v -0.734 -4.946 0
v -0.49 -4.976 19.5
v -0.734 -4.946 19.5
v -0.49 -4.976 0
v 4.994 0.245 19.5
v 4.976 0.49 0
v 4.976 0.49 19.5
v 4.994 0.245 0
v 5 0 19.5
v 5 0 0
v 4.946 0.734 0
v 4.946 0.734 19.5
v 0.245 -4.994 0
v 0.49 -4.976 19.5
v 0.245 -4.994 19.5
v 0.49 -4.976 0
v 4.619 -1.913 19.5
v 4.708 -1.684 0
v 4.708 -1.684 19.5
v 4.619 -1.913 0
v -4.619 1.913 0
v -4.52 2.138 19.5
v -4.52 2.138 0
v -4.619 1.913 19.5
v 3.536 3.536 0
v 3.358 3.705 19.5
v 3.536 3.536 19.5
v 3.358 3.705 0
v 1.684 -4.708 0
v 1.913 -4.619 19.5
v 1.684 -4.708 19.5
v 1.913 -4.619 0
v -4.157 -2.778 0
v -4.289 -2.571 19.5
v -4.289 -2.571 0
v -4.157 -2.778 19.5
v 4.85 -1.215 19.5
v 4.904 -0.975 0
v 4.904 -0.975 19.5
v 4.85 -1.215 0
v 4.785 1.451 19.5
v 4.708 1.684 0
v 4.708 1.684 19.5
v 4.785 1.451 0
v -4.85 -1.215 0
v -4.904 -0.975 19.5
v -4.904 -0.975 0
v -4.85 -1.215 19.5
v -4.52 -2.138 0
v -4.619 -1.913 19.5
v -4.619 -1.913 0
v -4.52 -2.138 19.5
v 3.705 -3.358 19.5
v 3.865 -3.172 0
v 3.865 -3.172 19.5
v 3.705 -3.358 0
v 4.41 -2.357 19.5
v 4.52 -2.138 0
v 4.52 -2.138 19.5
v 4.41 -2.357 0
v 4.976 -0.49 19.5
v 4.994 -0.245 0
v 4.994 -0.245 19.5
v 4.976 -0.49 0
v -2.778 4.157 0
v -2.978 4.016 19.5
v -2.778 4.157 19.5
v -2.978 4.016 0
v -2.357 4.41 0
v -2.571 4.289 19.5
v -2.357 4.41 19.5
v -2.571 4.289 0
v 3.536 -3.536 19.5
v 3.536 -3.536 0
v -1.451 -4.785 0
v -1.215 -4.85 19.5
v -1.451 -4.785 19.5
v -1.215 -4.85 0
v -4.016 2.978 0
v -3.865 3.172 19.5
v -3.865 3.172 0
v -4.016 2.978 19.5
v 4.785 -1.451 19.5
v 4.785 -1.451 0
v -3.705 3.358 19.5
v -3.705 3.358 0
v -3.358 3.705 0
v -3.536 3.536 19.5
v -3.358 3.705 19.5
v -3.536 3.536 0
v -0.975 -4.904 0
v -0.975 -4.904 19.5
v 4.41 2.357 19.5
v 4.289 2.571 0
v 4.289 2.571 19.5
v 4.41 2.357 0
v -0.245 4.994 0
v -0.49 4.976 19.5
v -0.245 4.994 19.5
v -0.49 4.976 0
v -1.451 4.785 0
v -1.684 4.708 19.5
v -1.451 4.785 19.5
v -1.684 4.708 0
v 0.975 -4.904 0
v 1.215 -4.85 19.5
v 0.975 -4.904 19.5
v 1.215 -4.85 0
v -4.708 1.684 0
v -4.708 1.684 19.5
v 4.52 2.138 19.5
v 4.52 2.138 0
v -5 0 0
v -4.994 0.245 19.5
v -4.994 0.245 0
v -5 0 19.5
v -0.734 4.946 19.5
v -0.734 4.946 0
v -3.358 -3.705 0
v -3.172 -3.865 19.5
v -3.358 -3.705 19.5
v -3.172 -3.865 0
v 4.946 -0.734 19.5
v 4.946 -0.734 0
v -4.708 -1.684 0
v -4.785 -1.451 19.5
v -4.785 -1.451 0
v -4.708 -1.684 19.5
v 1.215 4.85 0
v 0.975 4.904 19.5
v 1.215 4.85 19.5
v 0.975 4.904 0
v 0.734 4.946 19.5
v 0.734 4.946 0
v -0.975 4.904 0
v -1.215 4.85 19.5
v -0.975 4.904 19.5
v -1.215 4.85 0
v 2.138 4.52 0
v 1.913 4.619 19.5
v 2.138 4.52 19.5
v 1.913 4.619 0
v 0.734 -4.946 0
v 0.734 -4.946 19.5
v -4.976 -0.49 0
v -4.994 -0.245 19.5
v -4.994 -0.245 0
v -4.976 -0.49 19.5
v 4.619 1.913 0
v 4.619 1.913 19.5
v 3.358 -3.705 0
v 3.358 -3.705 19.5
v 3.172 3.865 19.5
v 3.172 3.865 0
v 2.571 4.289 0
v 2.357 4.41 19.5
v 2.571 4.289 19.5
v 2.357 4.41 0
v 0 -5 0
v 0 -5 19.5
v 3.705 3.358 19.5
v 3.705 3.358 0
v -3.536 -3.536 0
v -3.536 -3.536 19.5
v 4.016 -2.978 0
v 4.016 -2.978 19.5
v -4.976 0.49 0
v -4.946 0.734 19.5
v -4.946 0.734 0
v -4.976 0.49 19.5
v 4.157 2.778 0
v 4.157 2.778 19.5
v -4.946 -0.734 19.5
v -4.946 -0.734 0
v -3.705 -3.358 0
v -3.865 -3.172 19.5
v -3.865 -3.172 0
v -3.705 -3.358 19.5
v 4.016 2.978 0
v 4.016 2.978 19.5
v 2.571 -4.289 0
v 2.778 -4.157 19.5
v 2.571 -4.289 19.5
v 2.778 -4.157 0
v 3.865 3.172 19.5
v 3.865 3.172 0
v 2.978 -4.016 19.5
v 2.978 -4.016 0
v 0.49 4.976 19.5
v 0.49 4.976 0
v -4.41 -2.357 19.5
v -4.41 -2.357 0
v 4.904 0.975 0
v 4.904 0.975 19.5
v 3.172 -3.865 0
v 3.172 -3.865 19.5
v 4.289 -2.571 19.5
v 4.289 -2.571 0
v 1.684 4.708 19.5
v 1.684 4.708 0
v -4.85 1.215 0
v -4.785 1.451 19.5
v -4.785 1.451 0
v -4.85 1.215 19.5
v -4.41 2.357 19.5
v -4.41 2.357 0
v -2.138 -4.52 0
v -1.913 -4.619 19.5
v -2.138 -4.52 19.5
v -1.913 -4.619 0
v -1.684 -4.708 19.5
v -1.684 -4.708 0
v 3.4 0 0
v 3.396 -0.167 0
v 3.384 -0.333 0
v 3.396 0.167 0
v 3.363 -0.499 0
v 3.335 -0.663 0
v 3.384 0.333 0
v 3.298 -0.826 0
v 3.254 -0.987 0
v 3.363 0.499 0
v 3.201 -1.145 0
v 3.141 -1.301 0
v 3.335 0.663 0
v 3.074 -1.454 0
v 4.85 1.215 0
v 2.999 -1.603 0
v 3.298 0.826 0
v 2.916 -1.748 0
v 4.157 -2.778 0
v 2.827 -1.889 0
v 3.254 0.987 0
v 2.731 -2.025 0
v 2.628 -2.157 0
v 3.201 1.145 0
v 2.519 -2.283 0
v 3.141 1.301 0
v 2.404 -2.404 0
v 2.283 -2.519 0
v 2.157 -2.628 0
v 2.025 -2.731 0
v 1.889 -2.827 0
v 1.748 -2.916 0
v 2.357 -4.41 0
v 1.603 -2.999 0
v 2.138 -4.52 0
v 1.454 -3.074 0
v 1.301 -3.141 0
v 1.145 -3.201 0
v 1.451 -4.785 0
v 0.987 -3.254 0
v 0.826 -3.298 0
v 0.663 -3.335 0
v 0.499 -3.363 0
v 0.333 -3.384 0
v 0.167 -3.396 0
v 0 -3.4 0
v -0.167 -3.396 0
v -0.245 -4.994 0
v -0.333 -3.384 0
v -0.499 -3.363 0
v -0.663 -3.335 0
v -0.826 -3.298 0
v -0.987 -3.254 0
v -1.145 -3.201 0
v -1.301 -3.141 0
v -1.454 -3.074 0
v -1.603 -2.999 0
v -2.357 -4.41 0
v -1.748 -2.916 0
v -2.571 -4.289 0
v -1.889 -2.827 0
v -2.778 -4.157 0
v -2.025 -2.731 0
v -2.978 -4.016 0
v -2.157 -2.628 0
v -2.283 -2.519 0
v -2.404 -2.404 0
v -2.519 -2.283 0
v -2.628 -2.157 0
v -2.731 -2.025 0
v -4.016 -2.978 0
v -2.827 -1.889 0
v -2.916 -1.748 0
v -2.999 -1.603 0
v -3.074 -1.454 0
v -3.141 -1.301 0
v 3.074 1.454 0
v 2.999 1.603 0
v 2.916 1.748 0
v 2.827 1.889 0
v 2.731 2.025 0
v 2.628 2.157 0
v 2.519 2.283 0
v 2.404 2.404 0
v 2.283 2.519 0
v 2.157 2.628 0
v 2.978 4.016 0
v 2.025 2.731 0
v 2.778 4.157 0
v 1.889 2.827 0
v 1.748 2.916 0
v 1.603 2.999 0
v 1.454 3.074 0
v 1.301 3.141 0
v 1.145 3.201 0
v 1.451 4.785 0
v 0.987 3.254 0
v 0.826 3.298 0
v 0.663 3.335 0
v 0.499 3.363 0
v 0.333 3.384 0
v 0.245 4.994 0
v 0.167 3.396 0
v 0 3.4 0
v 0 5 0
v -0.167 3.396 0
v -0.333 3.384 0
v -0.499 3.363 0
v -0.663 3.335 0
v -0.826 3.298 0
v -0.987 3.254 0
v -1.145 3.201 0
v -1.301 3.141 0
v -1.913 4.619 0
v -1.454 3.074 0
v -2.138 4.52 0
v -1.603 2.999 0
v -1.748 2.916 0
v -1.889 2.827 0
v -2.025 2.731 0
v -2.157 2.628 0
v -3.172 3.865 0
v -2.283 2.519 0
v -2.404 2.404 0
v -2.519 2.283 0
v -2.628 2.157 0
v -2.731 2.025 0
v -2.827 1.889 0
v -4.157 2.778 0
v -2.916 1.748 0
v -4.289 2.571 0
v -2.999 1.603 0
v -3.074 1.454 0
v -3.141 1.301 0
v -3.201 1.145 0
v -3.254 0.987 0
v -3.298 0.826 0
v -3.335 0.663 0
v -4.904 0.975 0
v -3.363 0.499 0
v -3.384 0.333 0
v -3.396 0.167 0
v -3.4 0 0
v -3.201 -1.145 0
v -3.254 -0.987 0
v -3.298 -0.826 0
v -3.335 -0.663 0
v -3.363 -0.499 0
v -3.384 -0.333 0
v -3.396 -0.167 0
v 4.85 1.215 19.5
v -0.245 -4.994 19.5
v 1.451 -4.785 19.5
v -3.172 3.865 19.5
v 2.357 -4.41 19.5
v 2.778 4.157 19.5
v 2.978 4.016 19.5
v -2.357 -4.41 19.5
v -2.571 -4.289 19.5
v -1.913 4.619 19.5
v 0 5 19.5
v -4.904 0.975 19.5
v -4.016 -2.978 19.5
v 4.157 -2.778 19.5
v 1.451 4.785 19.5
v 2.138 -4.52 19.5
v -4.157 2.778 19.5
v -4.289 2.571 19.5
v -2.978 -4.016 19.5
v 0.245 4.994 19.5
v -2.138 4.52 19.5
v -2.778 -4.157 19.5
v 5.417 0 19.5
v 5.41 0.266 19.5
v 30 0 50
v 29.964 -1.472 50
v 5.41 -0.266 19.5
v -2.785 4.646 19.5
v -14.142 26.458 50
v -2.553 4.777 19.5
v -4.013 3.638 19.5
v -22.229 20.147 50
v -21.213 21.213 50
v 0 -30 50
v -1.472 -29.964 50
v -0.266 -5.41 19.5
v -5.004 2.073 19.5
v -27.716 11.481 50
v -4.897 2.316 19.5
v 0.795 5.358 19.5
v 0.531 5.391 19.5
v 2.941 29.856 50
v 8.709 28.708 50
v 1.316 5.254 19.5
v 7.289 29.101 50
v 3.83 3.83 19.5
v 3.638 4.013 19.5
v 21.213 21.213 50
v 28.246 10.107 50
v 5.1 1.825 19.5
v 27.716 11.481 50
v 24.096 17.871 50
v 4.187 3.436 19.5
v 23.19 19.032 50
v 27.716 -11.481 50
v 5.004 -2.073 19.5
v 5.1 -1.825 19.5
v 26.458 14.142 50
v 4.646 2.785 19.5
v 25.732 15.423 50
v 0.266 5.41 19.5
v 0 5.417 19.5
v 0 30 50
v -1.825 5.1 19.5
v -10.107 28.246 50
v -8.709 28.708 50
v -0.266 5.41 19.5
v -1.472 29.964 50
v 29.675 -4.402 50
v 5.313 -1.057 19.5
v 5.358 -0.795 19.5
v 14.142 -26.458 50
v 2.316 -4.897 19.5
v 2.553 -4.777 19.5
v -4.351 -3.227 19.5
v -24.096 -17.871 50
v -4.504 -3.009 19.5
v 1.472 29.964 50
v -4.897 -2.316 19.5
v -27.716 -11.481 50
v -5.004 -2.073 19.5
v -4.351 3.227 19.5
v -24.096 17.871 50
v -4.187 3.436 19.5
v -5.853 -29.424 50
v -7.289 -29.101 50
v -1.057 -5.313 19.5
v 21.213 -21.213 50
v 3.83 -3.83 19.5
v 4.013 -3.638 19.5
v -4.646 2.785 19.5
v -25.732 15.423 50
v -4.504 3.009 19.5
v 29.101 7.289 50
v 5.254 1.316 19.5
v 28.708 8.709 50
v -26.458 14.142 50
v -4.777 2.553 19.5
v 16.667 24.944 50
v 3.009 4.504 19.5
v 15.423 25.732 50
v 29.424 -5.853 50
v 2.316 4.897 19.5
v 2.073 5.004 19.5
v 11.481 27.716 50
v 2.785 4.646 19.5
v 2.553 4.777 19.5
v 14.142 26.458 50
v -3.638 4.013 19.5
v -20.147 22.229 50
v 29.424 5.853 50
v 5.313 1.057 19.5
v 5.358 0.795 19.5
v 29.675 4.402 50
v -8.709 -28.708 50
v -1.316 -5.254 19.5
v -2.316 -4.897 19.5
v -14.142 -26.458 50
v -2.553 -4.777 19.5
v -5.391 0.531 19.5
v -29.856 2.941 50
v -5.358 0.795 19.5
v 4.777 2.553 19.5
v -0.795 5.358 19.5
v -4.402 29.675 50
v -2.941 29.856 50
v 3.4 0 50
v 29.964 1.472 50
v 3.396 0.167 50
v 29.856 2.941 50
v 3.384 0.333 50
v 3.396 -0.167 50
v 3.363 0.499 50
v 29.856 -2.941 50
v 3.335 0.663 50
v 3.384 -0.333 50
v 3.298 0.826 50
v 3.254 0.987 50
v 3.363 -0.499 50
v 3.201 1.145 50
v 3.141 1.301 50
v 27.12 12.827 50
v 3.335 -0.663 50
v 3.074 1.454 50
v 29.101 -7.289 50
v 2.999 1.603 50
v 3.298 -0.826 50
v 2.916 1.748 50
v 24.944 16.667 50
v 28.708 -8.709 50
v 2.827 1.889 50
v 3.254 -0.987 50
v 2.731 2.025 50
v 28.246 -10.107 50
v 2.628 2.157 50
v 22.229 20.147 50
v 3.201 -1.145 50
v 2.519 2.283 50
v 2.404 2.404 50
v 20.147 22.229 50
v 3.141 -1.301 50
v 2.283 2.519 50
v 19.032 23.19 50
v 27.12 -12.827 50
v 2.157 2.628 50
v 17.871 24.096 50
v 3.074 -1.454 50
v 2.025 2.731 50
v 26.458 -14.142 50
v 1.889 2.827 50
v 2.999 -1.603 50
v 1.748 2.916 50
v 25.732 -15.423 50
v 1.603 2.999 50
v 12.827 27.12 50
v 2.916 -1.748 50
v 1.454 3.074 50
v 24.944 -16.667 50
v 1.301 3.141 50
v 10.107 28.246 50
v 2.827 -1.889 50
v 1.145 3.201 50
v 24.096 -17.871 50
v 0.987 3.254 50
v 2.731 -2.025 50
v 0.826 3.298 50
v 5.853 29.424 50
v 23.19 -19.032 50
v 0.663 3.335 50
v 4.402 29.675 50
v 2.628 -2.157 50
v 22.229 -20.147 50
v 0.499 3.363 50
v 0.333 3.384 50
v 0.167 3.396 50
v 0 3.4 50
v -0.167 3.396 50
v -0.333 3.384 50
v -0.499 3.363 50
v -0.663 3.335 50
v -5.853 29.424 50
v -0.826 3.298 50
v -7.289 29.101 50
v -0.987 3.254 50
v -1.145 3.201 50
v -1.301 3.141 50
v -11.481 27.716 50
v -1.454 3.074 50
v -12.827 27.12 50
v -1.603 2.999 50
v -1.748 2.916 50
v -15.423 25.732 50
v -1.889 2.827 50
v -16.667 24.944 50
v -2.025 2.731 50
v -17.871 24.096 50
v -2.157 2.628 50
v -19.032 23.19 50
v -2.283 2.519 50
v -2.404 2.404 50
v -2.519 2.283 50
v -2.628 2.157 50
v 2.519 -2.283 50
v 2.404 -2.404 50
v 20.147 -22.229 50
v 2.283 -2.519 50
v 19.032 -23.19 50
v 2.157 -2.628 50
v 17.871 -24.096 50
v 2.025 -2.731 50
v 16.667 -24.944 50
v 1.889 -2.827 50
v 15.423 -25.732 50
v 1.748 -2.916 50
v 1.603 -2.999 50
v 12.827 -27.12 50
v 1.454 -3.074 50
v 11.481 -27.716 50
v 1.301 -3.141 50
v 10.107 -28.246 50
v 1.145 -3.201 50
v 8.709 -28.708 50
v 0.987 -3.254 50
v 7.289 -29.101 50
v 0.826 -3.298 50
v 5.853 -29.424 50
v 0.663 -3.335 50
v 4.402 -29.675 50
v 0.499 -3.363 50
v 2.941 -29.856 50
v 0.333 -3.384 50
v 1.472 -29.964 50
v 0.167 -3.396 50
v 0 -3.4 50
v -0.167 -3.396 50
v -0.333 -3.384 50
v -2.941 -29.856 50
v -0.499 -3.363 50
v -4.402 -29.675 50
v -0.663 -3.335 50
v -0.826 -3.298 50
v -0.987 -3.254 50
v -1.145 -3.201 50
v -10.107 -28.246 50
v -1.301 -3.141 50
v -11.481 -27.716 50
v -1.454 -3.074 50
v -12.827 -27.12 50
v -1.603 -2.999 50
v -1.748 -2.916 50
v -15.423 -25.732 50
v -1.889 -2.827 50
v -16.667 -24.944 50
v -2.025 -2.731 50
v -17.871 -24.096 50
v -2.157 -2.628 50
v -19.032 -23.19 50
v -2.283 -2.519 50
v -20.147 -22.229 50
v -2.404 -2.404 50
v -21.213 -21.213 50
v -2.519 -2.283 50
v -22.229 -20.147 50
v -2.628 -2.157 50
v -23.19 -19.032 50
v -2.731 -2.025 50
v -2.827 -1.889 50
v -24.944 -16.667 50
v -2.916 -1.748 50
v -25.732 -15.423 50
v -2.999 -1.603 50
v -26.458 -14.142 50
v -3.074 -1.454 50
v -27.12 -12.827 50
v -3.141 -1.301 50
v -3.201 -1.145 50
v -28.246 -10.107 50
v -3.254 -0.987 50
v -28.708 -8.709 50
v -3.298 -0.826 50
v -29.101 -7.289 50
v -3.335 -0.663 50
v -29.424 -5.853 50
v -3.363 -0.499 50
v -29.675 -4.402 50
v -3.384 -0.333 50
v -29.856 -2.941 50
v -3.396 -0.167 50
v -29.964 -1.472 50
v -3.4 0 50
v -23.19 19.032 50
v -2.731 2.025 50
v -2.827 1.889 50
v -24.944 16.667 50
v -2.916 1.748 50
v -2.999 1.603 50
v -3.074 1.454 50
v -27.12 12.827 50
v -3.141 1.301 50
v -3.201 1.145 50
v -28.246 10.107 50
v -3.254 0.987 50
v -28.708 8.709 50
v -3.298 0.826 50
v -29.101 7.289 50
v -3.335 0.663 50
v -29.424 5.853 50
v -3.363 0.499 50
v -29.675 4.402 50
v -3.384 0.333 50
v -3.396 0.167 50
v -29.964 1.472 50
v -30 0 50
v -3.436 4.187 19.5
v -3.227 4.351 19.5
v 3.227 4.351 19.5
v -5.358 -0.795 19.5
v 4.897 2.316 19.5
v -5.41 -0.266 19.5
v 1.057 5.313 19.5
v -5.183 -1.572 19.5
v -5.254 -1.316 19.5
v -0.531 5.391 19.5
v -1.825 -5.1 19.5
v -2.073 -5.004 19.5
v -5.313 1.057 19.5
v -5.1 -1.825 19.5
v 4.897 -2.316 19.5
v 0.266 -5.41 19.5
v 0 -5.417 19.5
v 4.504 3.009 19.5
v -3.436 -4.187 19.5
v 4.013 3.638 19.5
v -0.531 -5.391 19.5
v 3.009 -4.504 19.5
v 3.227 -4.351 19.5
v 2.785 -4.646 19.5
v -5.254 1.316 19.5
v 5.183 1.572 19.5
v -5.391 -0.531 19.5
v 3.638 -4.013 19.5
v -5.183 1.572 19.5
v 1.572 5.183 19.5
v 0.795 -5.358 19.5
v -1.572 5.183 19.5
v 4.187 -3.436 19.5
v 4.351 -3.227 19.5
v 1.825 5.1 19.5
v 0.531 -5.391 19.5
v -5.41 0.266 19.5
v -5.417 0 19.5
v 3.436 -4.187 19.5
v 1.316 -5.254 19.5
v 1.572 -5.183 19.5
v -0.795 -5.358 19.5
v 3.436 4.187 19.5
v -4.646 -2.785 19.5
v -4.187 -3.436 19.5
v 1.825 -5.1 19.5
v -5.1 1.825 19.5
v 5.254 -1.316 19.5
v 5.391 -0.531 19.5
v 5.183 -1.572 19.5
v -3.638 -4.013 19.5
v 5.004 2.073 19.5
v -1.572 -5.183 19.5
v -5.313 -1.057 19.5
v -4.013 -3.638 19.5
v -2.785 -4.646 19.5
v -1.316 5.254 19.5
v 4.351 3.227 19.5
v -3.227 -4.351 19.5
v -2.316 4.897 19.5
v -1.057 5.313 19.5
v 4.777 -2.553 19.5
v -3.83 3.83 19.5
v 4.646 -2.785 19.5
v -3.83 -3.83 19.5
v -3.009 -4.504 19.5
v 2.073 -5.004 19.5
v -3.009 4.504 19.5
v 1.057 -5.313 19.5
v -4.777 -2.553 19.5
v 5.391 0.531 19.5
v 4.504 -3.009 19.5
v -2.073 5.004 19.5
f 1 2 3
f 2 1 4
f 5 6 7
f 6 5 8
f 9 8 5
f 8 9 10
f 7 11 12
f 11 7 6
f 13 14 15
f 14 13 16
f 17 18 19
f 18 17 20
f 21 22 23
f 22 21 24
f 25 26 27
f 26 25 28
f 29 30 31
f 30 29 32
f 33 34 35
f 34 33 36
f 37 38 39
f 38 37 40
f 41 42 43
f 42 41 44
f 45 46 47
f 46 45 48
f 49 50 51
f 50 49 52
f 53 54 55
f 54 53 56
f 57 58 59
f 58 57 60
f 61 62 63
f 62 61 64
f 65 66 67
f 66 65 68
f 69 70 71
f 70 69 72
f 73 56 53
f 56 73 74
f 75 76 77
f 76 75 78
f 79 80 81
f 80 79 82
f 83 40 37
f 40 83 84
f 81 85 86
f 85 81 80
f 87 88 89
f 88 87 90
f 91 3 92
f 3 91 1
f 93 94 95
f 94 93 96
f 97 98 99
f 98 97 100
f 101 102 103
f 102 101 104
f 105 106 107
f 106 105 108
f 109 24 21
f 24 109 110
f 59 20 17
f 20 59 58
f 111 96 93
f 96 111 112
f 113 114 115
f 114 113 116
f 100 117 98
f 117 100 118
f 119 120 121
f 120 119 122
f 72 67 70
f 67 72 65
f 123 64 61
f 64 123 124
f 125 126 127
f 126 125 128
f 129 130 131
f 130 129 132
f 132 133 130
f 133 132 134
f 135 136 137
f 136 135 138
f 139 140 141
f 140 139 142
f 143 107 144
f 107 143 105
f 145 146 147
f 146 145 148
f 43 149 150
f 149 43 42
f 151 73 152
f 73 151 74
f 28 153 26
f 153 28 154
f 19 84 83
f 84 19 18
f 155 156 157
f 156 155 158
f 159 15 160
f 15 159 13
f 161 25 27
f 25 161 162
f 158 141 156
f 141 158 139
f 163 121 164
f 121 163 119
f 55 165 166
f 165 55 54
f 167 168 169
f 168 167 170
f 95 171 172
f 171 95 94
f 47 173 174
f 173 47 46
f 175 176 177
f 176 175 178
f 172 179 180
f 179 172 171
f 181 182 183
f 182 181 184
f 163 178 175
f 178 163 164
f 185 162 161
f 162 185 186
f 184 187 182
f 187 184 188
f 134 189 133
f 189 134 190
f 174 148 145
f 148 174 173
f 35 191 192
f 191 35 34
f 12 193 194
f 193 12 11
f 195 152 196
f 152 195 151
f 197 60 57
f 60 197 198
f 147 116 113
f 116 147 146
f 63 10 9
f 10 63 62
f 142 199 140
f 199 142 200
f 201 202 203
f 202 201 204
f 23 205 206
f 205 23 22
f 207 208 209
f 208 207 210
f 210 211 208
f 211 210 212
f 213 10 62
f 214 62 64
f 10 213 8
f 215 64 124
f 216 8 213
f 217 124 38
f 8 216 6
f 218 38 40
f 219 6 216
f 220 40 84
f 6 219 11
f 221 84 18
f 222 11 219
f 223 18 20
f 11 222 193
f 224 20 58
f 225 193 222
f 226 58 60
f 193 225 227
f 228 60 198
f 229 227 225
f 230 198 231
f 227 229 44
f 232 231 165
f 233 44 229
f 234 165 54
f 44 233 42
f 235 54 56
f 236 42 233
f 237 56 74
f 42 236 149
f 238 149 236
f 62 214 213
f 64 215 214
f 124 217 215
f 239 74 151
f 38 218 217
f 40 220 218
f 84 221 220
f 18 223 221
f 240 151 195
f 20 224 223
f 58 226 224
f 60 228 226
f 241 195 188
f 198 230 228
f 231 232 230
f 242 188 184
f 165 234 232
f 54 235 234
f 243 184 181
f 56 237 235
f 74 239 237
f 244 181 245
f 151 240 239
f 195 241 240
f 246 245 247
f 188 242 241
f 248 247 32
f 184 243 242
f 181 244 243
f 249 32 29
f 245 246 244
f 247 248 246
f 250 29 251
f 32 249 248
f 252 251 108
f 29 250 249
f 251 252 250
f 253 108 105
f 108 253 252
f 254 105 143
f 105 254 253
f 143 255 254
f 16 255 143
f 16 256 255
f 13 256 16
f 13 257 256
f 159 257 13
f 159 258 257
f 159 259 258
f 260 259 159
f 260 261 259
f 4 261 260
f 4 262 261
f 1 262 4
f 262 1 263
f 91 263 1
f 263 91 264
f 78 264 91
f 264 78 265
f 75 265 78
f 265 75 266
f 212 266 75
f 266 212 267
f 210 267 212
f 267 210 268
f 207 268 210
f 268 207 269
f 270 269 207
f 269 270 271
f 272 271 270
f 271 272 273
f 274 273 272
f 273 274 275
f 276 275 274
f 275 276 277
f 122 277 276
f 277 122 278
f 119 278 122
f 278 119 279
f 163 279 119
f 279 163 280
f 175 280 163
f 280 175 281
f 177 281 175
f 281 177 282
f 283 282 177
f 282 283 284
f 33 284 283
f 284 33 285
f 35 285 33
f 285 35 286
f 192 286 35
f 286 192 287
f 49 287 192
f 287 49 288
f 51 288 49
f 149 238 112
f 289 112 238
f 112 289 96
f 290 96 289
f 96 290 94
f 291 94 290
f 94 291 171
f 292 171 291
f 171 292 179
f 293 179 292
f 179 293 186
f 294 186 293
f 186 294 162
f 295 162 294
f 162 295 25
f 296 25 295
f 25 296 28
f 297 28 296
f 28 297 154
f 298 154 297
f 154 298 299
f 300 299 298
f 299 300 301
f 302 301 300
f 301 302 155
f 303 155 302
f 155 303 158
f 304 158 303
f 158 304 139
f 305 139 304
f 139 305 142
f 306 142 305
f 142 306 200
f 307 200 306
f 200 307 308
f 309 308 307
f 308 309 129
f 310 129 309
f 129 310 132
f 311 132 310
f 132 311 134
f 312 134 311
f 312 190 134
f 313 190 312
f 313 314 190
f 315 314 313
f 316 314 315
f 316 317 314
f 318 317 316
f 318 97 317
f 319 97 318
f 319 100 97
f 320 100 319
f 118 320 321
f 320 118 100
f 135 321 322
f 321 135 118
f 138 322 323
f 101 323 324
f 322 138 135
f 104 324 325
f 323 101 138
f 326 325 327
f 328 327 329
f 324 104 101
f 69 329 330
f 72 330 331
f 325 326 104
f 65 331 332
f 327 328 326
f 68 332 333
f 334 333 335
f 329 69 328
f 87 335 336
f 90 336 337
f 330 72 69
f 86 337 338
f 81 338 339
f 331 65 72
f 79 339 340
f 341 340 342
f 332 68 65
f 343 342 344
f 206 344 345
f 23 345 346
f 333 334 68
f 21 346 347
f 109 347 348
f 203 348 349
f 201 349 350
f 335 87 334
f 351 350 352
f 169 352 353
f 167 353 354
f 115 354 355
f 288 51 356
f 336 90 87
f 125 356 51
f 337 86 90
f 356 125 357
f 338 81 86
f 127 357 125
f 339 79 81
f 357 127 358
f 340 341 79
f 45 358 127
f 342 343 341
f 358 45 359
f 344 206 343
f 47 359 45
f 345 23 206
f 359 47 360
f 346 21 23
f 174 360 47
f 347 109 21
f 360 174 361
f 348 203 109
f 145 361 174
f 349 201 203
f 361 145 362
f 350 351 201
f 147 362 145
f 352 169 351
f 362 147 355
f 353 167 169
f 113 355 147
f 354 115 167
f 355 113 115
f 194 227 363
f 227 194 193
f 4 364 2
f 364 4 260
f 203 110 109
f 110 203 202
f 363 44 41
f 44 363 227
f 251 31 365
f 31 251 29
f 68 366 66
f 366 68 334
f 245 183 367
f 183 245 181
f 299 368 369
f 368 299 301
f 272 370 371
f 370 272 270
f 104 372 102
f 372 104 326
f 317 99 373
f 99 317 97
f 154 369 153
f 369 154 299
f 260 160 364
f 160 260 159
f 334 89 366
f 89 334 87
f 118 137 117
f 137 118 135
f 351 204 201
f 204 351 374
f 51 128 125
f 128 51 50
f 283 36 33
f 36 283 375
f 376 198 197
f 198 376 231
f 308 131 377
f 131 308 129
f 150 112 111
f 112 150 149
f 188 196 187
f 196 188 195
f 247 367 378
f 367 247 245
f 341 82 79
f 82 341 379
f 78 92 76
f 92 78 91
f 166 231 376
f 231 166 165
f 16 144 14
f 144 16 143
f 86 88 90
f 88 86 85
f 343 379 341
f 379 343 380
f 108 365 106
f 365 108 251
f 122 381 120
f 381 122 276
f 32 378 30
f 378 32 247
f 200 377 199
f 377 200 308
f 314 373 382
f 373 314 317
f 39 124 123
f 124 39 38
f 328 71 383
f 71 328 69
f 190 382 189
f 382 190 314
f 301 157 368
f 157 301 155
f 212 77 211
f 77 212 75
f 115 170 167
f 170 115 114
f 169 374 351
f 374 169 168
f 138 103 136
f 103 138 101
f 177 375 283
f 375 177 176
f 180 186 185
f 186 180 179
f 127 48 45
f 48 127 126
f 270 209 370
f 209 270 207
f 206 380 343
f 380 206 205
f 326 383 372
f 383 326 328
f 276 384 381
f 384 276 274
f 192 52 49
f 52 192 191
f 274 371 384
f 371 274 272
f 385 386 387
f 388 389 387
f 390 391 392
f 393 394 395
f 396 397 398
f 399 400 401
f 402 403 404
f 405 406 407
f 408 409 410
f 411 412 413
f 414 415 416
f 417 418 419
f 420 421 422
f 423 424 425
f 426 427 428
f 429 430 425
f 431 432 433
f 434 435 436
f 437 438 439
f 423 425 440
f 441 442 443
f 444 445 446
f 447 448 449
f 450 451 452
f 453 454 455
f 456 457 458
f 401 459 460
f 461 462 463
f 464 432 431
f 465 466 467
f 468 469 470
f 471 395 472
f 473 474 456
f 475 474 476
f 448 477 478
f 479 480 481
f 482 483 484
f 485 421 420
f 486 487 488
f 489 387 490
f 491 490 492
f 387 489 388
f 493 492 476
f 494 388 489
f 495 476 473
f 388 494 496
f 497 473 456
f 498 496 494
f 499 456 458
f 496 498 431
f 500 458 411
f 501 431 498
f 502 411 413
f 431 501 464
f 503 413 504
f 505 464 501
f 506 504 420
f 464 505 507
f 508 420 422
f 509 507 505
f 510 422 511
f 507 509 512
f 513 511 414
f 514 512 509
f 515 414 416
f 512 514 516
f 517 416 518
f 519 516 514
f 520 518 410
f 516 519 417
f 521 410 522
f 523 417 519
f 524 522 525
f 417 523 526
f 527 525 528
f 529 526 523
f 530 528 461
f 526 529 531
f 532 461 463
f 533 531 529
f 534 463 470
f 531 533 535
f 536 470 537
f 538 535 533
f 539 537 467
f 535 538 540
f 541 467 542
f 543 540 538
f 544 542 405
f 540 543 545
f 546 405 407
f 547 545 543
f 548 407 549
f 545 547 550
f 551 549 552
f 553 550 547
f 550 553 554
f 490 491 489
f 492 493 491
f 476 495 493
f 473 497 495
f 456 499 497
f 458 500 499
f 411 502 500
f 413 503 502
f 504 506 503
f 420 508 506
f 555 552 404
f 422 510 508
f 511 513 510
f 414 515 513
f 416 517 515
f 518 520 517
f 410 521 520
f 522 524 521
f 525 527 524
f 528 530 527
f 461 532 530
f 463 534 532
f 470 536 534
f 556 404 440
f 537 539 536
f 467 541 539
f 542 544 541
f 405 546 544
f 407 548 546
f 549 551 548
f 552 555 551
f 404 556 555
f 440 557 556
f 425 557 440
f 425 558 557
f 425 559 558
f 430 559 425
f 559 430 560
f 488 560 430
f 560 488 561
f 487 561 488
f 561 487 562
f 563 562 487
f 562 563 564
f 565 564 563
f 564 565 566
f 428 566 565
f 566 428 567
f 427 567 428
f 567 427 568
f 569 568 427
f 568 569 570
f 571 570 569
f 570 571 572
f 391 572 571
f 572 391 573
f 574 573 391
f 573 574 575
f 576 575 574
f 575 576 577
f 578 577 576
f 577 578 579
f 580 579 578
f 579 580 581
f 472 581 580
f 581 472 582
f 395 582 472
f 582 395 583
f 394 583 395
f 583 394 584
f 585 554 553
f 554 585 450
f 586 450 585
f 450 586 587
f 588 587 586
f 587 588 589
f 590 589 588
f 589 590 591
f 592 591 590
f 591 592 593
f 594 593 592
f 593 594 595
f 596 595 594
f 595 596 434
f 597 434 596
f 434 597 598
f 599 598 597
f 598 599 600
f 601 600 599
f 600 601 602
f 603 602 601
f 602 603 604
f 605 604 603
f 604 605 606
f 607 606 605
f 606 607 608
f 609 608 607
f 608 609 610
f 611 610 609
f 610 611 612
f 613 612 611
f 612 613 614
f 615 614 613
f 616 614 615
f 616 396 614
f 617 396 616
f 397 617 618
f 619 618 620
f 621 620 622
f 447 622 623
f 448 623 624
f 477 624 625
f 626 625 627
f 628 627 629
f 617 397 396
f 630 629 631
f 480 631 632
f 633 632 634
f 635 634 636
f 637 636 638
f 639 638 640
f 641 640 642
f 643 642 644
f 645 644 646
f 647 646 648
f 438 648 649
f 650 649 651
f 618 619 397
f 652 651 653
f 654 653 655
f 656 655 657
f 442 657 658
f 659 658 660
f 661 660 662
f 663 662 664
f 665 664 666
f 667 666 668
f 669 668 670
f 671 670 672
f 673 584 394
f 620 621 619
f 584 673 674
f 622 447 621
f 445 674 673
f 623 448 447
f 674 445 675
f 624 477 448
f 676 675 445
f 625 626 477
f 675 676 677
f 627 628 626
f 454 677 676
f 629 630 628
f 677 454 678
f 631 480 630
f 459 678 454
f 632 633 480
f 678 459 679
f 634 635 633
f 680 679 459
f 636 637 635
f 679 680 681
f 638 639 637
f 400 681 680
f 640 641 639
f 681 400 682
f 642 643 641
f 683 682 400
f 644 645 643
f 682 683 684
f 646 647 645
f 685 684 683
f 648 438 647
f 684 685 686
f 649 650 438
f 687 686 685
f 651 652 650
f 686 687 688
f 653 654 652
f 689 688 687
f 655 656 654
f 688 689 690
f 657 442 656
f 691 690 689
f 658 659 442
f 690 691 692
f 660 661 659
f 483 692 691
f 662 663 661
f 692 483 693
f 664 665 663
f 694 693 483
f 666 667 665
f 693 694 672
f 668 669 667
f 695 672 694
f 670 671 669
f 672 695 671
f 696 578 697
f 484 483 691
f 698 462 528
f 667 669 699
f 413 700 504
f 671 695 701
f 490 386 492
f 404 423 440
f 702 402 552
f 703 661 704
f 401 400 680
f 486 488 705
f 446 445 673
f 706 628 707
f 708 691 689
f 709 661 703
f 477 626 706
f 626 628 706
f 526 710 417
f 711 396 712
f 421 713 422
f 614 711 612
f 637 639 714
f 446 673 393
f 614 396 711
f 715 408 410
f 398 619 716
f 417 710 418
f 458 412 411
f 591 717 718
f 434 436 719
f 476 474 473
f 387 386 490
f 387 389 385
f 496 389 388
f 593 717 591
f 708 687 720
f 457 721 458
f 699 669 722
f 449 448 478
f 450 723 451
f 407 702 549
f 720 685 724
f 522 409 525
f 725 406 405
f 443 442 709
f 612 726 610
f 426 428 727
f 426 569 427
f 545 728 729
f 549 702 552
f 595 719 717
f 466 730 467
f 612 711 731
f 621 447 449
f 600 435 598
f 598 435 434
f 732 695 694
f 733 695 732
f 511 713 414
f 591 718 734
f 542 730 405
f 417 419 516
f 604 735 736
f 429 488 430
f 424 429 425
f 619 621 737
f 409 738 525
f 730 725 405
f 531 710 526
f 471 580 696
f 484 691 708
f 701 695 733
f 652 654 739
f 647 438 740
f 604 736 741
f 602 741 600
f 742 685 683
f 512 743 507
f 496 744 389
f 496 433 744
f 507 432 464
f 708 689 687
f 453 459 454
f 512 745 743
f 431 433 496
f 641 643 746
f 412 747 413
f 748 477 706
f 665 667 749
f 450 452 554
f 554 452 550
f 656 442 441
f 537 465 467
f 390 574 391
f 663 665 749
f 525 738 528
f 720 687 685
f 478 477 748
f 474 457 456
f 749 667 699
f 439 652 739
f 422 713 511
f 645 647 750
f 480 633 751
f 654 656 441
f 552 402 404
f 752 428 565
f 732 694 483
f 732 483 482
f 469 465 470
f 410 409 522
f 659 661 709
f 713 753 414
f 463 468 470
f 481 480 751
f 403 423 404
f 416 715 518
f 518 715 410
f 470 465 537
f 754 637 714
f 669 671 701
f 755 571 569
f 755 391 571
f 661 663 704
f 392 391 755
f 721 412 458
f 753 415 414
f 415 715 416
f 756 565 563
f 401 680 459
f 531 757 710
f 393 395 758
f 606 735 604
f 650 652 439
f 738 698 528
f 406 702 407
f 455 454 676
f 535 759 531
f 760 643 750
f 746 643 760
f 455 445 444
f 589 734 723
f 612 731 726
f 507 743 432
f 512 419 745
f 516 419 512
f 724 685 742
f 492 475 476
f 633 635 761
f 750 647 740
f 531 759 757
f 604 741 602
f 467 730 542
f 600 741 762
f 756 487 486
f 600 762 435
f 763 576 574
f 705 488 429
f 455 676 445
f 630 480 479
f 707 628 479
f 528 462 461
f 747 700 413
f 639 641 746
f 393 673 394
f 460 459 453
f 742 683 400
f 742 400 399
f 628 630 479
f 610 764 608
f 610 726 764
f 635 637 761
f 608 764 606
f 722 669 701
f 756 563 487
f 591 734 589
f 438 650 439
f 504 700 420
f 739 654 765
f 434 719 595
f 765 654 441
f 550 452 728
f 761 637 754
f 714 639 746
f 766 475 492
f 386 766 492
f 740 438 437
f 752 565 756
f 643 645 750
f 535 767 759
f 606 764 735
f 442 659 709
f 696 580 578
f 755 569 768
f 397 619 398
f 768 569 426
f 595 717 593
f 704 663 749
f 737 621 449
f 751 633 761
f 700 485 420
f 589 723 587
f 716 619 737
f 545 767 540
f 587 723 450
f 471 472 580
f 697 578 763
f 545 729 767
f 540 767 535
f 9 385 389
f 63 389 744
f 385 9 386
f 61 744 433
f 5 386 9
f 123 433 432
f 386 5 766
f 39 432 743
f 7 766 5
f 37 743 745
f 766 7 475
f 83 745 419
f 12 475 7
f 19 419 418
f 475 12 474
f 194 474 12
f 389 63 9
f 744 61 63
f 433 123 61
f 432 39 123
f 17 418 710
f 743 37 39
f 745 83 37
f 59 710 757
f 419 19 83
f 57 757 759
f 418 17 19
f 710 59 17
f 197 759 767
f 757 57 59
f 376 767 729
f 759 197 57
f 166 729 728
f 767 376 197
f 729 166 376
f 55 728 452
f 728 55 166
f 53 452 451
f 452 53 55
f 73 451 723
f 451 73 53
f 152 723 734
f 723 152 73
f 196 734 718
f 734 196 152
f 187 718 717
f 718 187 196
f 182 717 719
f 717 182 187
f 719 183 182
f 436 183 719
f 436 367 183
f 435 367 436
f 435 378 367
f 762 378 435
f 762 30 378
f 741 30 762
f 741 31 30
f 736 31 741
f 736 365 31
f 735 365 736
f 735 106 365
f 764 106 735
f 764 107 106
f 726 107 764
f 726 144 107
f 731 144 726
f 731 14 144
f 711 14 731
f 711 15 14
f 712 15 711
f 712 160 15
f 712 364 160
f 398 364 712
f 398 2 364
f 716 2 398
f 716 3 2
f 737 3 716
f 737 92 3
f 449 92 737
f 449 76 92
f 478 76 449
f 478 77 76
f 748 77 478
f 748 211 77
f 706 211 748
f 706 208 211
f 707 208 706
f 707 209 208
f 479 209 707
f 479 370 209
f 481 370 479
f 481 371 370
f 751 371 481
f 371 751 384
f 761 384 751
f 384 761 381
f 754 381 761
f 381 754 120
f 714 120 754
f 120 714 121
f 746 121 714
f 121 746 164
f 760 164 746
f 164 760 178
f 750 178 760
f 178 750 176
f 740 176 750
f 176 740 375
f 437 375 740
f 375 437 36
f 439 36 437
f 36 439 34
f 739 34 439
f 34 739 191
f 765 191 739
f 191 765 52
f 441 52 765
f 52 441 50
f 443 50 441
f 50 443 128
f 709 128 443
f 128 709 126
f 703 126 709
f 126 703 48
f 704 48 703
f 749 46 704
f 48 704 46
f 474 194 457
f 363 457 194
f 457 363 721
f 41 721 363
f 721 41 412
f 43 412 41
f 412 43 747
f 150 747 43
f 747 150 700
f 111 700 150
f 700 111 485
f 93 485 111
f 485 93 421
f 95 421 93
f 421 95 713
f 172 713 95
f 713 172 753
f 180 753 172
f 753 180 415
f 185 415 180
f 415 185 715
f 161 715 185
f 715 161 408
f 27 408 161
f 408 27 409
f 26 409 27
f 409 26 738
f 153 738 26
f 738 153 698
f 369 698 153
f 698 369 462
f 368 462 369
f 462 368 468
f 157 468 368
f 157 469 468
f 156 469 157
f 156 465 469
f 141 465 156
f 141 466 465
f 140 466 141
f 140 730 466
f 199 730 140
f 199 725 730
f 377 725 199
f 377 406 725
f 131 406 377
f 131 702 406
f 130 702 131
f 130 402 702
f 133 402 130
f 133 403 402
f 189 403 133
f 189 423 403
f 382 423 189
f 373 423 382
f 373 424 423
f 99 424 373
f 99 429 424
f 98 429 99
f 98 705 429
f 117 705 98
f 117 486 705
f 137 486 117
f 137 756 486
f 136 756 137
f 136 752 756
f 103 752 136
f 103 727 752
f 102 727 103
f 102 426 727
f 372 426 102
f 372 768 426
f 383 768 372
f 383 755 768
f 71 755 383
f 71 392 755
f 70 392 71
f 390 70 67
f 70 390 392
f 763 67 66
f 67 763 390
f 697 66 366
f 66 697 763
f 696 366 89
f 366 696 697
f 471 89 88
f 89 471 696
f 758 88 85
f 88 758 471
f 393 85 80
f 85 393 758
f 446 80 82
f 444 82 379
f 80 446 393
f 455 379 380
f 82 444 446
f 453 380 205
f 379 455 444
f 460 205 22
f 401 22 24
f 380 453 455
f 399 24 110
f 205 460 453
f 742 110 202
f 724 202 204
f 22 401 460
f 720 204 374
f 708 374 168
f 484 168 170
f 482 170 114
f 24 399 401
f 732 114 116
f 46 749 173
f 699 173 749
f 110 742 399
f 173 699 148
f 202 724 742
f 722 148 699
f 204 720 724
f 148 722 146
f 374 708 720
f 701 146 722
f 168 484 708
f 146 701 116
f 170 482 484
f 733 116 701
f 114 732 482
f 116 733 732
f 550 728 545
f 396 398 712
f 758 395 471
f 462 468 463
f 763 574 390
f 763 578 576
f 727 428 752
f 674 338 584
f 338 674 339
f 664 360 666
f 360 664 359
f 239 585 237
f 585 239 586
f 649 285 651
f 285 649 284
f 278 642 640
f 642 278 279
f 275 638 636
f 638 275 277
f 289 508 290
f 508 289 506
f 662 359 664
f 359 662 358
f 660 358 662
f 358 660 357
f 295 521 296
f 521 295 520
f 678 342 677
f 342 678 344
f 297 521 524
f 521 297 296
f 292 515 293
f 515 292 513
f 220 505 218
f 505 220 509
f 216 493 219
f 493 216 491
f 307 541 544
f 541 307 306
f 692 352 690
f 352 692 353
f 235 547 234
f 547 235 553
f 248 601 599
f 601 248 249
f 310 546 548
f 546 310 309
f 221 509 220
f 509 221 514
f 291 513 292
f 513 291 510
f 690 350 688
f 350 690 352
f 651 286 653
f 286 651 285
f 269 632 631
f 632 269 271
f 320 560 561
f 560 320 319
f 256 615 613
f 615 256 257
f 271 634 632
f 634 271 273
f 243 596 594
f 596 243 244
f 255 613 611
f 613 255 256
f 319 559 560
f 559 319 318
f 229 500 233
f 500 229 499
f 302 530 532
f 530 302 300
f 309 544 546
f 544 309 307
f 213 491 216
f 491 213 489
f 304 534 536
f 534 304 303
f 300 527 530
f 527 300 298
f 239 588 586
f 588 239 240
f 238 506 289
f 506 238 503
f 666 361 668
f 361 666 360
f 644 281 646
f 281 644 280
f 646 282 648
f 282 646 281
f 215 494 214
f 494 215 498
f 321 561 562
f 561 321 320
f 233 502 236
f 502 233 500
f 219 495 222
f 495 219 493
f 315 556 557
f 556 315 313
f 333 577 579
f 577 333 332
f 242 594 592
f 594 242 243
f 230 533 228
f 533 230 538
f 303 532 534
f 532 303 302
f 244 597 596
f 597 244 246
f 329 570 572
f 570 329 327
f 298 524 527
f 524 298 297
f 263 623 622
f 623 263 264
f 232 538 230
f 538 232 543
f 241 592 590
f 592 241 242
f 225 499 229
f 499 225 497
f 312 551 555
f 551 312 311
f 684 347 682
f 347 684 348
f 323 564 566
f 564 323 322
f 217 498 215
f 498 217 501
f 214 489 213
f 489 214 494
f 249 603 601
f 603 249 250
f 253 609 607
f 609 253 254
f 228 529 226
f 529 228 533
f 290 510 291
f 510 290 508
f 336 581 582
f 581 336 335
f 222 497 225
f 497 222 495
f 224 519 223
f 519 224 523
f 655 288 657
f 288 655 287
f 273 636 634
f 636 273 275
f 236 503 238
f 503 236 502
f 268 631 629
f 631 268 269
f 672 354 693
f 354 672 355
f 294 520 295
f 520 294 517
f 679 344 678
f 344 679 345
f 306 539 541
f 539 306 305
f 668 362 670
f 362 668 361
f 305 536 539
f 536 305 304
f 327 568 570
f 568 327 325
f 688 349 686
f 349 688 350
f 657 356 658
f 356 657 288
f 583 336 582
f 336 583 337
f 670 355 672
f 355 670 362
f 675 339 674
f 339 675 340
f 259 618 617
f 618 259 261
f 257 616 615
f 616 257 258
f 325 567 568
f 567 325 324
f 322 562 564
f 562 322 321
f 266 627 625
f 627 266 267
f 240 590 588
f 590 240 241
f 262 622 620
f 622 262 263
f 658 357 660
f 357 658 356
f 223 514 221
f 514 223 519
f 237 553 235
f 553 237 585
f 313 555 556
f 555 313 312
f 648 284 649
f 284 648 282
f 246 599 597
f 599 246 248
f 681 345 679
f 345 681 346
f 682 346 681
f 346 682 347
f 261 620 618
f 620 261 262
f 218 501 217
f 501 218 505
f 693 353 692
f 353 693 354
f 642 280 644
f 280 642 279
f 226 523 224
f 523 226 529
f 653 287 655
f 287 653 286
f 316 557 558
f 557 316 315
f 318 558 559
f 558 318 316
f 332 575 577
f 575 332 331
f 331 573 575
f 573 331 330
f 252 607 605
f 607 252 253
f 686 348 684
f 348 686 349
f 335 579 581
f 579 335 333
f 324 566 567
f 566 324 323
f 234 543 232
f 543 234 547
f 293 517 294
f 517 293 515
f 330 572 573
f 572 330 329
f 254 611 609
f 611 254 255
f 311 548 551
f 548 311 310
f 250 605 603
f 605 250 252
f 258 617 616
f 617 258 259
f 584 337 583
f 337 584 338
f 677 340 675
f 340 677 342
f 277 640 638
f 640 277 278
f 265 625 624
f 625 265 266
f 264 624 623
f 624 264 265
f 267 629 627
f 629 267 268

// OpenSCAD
// Small lab funnel, printed upright (wide opening at the top)
// Units: mm

// ---------------- Parameters ----------------
spout_od      = 10;    // spout outer diameter
spout_len     = 20;    // spout length (z = 0 to z = 20)
cone_top_d    = 60;    // cone outer diameter at the rim (z = 50)
cone_bottom_d = 10;    // cone outer diameter where it meets the spout (z = 20)
wall          = 1.6;   // wall thickness everywhere
overlap       = 0.5;   // spout extends this far into the cone for a solid union
$fn           = 128;   // facet count for round features

// Derived values
spout_id = spout_od - 2 * wall;           // spout bore diameter (6.8 mm)
cone_h   = 50 - 20;                       // cone height (30 mm)
// Cone outer diameter at the overlap height (z = spout_len - overlap)
cone_overlap_d = cone_bottom_d - (overlap / cone_h) * (cone_bottom_d - cone_top_d);

// ---------------- Model ----------------
difference() {
    union() {
        // Straight spout tube (z = 0 to z = 20)
        cylinder(d = spout_od, h = spout_len);

        // Cone: overlap height 0..30 maps to global z = 20..50
        translate([0, 0, spout_len - overlap])
            cylinder(d1 = cone_overlap_d, d2 = cone_top_d, h = cone_h + overlap);
    }

    // Through-bore: the spout bore runs the full height (z = 0 to z = 50)
    translate([0, 0, -1])
        cylinder(d = spout_id, h = 51);
}
